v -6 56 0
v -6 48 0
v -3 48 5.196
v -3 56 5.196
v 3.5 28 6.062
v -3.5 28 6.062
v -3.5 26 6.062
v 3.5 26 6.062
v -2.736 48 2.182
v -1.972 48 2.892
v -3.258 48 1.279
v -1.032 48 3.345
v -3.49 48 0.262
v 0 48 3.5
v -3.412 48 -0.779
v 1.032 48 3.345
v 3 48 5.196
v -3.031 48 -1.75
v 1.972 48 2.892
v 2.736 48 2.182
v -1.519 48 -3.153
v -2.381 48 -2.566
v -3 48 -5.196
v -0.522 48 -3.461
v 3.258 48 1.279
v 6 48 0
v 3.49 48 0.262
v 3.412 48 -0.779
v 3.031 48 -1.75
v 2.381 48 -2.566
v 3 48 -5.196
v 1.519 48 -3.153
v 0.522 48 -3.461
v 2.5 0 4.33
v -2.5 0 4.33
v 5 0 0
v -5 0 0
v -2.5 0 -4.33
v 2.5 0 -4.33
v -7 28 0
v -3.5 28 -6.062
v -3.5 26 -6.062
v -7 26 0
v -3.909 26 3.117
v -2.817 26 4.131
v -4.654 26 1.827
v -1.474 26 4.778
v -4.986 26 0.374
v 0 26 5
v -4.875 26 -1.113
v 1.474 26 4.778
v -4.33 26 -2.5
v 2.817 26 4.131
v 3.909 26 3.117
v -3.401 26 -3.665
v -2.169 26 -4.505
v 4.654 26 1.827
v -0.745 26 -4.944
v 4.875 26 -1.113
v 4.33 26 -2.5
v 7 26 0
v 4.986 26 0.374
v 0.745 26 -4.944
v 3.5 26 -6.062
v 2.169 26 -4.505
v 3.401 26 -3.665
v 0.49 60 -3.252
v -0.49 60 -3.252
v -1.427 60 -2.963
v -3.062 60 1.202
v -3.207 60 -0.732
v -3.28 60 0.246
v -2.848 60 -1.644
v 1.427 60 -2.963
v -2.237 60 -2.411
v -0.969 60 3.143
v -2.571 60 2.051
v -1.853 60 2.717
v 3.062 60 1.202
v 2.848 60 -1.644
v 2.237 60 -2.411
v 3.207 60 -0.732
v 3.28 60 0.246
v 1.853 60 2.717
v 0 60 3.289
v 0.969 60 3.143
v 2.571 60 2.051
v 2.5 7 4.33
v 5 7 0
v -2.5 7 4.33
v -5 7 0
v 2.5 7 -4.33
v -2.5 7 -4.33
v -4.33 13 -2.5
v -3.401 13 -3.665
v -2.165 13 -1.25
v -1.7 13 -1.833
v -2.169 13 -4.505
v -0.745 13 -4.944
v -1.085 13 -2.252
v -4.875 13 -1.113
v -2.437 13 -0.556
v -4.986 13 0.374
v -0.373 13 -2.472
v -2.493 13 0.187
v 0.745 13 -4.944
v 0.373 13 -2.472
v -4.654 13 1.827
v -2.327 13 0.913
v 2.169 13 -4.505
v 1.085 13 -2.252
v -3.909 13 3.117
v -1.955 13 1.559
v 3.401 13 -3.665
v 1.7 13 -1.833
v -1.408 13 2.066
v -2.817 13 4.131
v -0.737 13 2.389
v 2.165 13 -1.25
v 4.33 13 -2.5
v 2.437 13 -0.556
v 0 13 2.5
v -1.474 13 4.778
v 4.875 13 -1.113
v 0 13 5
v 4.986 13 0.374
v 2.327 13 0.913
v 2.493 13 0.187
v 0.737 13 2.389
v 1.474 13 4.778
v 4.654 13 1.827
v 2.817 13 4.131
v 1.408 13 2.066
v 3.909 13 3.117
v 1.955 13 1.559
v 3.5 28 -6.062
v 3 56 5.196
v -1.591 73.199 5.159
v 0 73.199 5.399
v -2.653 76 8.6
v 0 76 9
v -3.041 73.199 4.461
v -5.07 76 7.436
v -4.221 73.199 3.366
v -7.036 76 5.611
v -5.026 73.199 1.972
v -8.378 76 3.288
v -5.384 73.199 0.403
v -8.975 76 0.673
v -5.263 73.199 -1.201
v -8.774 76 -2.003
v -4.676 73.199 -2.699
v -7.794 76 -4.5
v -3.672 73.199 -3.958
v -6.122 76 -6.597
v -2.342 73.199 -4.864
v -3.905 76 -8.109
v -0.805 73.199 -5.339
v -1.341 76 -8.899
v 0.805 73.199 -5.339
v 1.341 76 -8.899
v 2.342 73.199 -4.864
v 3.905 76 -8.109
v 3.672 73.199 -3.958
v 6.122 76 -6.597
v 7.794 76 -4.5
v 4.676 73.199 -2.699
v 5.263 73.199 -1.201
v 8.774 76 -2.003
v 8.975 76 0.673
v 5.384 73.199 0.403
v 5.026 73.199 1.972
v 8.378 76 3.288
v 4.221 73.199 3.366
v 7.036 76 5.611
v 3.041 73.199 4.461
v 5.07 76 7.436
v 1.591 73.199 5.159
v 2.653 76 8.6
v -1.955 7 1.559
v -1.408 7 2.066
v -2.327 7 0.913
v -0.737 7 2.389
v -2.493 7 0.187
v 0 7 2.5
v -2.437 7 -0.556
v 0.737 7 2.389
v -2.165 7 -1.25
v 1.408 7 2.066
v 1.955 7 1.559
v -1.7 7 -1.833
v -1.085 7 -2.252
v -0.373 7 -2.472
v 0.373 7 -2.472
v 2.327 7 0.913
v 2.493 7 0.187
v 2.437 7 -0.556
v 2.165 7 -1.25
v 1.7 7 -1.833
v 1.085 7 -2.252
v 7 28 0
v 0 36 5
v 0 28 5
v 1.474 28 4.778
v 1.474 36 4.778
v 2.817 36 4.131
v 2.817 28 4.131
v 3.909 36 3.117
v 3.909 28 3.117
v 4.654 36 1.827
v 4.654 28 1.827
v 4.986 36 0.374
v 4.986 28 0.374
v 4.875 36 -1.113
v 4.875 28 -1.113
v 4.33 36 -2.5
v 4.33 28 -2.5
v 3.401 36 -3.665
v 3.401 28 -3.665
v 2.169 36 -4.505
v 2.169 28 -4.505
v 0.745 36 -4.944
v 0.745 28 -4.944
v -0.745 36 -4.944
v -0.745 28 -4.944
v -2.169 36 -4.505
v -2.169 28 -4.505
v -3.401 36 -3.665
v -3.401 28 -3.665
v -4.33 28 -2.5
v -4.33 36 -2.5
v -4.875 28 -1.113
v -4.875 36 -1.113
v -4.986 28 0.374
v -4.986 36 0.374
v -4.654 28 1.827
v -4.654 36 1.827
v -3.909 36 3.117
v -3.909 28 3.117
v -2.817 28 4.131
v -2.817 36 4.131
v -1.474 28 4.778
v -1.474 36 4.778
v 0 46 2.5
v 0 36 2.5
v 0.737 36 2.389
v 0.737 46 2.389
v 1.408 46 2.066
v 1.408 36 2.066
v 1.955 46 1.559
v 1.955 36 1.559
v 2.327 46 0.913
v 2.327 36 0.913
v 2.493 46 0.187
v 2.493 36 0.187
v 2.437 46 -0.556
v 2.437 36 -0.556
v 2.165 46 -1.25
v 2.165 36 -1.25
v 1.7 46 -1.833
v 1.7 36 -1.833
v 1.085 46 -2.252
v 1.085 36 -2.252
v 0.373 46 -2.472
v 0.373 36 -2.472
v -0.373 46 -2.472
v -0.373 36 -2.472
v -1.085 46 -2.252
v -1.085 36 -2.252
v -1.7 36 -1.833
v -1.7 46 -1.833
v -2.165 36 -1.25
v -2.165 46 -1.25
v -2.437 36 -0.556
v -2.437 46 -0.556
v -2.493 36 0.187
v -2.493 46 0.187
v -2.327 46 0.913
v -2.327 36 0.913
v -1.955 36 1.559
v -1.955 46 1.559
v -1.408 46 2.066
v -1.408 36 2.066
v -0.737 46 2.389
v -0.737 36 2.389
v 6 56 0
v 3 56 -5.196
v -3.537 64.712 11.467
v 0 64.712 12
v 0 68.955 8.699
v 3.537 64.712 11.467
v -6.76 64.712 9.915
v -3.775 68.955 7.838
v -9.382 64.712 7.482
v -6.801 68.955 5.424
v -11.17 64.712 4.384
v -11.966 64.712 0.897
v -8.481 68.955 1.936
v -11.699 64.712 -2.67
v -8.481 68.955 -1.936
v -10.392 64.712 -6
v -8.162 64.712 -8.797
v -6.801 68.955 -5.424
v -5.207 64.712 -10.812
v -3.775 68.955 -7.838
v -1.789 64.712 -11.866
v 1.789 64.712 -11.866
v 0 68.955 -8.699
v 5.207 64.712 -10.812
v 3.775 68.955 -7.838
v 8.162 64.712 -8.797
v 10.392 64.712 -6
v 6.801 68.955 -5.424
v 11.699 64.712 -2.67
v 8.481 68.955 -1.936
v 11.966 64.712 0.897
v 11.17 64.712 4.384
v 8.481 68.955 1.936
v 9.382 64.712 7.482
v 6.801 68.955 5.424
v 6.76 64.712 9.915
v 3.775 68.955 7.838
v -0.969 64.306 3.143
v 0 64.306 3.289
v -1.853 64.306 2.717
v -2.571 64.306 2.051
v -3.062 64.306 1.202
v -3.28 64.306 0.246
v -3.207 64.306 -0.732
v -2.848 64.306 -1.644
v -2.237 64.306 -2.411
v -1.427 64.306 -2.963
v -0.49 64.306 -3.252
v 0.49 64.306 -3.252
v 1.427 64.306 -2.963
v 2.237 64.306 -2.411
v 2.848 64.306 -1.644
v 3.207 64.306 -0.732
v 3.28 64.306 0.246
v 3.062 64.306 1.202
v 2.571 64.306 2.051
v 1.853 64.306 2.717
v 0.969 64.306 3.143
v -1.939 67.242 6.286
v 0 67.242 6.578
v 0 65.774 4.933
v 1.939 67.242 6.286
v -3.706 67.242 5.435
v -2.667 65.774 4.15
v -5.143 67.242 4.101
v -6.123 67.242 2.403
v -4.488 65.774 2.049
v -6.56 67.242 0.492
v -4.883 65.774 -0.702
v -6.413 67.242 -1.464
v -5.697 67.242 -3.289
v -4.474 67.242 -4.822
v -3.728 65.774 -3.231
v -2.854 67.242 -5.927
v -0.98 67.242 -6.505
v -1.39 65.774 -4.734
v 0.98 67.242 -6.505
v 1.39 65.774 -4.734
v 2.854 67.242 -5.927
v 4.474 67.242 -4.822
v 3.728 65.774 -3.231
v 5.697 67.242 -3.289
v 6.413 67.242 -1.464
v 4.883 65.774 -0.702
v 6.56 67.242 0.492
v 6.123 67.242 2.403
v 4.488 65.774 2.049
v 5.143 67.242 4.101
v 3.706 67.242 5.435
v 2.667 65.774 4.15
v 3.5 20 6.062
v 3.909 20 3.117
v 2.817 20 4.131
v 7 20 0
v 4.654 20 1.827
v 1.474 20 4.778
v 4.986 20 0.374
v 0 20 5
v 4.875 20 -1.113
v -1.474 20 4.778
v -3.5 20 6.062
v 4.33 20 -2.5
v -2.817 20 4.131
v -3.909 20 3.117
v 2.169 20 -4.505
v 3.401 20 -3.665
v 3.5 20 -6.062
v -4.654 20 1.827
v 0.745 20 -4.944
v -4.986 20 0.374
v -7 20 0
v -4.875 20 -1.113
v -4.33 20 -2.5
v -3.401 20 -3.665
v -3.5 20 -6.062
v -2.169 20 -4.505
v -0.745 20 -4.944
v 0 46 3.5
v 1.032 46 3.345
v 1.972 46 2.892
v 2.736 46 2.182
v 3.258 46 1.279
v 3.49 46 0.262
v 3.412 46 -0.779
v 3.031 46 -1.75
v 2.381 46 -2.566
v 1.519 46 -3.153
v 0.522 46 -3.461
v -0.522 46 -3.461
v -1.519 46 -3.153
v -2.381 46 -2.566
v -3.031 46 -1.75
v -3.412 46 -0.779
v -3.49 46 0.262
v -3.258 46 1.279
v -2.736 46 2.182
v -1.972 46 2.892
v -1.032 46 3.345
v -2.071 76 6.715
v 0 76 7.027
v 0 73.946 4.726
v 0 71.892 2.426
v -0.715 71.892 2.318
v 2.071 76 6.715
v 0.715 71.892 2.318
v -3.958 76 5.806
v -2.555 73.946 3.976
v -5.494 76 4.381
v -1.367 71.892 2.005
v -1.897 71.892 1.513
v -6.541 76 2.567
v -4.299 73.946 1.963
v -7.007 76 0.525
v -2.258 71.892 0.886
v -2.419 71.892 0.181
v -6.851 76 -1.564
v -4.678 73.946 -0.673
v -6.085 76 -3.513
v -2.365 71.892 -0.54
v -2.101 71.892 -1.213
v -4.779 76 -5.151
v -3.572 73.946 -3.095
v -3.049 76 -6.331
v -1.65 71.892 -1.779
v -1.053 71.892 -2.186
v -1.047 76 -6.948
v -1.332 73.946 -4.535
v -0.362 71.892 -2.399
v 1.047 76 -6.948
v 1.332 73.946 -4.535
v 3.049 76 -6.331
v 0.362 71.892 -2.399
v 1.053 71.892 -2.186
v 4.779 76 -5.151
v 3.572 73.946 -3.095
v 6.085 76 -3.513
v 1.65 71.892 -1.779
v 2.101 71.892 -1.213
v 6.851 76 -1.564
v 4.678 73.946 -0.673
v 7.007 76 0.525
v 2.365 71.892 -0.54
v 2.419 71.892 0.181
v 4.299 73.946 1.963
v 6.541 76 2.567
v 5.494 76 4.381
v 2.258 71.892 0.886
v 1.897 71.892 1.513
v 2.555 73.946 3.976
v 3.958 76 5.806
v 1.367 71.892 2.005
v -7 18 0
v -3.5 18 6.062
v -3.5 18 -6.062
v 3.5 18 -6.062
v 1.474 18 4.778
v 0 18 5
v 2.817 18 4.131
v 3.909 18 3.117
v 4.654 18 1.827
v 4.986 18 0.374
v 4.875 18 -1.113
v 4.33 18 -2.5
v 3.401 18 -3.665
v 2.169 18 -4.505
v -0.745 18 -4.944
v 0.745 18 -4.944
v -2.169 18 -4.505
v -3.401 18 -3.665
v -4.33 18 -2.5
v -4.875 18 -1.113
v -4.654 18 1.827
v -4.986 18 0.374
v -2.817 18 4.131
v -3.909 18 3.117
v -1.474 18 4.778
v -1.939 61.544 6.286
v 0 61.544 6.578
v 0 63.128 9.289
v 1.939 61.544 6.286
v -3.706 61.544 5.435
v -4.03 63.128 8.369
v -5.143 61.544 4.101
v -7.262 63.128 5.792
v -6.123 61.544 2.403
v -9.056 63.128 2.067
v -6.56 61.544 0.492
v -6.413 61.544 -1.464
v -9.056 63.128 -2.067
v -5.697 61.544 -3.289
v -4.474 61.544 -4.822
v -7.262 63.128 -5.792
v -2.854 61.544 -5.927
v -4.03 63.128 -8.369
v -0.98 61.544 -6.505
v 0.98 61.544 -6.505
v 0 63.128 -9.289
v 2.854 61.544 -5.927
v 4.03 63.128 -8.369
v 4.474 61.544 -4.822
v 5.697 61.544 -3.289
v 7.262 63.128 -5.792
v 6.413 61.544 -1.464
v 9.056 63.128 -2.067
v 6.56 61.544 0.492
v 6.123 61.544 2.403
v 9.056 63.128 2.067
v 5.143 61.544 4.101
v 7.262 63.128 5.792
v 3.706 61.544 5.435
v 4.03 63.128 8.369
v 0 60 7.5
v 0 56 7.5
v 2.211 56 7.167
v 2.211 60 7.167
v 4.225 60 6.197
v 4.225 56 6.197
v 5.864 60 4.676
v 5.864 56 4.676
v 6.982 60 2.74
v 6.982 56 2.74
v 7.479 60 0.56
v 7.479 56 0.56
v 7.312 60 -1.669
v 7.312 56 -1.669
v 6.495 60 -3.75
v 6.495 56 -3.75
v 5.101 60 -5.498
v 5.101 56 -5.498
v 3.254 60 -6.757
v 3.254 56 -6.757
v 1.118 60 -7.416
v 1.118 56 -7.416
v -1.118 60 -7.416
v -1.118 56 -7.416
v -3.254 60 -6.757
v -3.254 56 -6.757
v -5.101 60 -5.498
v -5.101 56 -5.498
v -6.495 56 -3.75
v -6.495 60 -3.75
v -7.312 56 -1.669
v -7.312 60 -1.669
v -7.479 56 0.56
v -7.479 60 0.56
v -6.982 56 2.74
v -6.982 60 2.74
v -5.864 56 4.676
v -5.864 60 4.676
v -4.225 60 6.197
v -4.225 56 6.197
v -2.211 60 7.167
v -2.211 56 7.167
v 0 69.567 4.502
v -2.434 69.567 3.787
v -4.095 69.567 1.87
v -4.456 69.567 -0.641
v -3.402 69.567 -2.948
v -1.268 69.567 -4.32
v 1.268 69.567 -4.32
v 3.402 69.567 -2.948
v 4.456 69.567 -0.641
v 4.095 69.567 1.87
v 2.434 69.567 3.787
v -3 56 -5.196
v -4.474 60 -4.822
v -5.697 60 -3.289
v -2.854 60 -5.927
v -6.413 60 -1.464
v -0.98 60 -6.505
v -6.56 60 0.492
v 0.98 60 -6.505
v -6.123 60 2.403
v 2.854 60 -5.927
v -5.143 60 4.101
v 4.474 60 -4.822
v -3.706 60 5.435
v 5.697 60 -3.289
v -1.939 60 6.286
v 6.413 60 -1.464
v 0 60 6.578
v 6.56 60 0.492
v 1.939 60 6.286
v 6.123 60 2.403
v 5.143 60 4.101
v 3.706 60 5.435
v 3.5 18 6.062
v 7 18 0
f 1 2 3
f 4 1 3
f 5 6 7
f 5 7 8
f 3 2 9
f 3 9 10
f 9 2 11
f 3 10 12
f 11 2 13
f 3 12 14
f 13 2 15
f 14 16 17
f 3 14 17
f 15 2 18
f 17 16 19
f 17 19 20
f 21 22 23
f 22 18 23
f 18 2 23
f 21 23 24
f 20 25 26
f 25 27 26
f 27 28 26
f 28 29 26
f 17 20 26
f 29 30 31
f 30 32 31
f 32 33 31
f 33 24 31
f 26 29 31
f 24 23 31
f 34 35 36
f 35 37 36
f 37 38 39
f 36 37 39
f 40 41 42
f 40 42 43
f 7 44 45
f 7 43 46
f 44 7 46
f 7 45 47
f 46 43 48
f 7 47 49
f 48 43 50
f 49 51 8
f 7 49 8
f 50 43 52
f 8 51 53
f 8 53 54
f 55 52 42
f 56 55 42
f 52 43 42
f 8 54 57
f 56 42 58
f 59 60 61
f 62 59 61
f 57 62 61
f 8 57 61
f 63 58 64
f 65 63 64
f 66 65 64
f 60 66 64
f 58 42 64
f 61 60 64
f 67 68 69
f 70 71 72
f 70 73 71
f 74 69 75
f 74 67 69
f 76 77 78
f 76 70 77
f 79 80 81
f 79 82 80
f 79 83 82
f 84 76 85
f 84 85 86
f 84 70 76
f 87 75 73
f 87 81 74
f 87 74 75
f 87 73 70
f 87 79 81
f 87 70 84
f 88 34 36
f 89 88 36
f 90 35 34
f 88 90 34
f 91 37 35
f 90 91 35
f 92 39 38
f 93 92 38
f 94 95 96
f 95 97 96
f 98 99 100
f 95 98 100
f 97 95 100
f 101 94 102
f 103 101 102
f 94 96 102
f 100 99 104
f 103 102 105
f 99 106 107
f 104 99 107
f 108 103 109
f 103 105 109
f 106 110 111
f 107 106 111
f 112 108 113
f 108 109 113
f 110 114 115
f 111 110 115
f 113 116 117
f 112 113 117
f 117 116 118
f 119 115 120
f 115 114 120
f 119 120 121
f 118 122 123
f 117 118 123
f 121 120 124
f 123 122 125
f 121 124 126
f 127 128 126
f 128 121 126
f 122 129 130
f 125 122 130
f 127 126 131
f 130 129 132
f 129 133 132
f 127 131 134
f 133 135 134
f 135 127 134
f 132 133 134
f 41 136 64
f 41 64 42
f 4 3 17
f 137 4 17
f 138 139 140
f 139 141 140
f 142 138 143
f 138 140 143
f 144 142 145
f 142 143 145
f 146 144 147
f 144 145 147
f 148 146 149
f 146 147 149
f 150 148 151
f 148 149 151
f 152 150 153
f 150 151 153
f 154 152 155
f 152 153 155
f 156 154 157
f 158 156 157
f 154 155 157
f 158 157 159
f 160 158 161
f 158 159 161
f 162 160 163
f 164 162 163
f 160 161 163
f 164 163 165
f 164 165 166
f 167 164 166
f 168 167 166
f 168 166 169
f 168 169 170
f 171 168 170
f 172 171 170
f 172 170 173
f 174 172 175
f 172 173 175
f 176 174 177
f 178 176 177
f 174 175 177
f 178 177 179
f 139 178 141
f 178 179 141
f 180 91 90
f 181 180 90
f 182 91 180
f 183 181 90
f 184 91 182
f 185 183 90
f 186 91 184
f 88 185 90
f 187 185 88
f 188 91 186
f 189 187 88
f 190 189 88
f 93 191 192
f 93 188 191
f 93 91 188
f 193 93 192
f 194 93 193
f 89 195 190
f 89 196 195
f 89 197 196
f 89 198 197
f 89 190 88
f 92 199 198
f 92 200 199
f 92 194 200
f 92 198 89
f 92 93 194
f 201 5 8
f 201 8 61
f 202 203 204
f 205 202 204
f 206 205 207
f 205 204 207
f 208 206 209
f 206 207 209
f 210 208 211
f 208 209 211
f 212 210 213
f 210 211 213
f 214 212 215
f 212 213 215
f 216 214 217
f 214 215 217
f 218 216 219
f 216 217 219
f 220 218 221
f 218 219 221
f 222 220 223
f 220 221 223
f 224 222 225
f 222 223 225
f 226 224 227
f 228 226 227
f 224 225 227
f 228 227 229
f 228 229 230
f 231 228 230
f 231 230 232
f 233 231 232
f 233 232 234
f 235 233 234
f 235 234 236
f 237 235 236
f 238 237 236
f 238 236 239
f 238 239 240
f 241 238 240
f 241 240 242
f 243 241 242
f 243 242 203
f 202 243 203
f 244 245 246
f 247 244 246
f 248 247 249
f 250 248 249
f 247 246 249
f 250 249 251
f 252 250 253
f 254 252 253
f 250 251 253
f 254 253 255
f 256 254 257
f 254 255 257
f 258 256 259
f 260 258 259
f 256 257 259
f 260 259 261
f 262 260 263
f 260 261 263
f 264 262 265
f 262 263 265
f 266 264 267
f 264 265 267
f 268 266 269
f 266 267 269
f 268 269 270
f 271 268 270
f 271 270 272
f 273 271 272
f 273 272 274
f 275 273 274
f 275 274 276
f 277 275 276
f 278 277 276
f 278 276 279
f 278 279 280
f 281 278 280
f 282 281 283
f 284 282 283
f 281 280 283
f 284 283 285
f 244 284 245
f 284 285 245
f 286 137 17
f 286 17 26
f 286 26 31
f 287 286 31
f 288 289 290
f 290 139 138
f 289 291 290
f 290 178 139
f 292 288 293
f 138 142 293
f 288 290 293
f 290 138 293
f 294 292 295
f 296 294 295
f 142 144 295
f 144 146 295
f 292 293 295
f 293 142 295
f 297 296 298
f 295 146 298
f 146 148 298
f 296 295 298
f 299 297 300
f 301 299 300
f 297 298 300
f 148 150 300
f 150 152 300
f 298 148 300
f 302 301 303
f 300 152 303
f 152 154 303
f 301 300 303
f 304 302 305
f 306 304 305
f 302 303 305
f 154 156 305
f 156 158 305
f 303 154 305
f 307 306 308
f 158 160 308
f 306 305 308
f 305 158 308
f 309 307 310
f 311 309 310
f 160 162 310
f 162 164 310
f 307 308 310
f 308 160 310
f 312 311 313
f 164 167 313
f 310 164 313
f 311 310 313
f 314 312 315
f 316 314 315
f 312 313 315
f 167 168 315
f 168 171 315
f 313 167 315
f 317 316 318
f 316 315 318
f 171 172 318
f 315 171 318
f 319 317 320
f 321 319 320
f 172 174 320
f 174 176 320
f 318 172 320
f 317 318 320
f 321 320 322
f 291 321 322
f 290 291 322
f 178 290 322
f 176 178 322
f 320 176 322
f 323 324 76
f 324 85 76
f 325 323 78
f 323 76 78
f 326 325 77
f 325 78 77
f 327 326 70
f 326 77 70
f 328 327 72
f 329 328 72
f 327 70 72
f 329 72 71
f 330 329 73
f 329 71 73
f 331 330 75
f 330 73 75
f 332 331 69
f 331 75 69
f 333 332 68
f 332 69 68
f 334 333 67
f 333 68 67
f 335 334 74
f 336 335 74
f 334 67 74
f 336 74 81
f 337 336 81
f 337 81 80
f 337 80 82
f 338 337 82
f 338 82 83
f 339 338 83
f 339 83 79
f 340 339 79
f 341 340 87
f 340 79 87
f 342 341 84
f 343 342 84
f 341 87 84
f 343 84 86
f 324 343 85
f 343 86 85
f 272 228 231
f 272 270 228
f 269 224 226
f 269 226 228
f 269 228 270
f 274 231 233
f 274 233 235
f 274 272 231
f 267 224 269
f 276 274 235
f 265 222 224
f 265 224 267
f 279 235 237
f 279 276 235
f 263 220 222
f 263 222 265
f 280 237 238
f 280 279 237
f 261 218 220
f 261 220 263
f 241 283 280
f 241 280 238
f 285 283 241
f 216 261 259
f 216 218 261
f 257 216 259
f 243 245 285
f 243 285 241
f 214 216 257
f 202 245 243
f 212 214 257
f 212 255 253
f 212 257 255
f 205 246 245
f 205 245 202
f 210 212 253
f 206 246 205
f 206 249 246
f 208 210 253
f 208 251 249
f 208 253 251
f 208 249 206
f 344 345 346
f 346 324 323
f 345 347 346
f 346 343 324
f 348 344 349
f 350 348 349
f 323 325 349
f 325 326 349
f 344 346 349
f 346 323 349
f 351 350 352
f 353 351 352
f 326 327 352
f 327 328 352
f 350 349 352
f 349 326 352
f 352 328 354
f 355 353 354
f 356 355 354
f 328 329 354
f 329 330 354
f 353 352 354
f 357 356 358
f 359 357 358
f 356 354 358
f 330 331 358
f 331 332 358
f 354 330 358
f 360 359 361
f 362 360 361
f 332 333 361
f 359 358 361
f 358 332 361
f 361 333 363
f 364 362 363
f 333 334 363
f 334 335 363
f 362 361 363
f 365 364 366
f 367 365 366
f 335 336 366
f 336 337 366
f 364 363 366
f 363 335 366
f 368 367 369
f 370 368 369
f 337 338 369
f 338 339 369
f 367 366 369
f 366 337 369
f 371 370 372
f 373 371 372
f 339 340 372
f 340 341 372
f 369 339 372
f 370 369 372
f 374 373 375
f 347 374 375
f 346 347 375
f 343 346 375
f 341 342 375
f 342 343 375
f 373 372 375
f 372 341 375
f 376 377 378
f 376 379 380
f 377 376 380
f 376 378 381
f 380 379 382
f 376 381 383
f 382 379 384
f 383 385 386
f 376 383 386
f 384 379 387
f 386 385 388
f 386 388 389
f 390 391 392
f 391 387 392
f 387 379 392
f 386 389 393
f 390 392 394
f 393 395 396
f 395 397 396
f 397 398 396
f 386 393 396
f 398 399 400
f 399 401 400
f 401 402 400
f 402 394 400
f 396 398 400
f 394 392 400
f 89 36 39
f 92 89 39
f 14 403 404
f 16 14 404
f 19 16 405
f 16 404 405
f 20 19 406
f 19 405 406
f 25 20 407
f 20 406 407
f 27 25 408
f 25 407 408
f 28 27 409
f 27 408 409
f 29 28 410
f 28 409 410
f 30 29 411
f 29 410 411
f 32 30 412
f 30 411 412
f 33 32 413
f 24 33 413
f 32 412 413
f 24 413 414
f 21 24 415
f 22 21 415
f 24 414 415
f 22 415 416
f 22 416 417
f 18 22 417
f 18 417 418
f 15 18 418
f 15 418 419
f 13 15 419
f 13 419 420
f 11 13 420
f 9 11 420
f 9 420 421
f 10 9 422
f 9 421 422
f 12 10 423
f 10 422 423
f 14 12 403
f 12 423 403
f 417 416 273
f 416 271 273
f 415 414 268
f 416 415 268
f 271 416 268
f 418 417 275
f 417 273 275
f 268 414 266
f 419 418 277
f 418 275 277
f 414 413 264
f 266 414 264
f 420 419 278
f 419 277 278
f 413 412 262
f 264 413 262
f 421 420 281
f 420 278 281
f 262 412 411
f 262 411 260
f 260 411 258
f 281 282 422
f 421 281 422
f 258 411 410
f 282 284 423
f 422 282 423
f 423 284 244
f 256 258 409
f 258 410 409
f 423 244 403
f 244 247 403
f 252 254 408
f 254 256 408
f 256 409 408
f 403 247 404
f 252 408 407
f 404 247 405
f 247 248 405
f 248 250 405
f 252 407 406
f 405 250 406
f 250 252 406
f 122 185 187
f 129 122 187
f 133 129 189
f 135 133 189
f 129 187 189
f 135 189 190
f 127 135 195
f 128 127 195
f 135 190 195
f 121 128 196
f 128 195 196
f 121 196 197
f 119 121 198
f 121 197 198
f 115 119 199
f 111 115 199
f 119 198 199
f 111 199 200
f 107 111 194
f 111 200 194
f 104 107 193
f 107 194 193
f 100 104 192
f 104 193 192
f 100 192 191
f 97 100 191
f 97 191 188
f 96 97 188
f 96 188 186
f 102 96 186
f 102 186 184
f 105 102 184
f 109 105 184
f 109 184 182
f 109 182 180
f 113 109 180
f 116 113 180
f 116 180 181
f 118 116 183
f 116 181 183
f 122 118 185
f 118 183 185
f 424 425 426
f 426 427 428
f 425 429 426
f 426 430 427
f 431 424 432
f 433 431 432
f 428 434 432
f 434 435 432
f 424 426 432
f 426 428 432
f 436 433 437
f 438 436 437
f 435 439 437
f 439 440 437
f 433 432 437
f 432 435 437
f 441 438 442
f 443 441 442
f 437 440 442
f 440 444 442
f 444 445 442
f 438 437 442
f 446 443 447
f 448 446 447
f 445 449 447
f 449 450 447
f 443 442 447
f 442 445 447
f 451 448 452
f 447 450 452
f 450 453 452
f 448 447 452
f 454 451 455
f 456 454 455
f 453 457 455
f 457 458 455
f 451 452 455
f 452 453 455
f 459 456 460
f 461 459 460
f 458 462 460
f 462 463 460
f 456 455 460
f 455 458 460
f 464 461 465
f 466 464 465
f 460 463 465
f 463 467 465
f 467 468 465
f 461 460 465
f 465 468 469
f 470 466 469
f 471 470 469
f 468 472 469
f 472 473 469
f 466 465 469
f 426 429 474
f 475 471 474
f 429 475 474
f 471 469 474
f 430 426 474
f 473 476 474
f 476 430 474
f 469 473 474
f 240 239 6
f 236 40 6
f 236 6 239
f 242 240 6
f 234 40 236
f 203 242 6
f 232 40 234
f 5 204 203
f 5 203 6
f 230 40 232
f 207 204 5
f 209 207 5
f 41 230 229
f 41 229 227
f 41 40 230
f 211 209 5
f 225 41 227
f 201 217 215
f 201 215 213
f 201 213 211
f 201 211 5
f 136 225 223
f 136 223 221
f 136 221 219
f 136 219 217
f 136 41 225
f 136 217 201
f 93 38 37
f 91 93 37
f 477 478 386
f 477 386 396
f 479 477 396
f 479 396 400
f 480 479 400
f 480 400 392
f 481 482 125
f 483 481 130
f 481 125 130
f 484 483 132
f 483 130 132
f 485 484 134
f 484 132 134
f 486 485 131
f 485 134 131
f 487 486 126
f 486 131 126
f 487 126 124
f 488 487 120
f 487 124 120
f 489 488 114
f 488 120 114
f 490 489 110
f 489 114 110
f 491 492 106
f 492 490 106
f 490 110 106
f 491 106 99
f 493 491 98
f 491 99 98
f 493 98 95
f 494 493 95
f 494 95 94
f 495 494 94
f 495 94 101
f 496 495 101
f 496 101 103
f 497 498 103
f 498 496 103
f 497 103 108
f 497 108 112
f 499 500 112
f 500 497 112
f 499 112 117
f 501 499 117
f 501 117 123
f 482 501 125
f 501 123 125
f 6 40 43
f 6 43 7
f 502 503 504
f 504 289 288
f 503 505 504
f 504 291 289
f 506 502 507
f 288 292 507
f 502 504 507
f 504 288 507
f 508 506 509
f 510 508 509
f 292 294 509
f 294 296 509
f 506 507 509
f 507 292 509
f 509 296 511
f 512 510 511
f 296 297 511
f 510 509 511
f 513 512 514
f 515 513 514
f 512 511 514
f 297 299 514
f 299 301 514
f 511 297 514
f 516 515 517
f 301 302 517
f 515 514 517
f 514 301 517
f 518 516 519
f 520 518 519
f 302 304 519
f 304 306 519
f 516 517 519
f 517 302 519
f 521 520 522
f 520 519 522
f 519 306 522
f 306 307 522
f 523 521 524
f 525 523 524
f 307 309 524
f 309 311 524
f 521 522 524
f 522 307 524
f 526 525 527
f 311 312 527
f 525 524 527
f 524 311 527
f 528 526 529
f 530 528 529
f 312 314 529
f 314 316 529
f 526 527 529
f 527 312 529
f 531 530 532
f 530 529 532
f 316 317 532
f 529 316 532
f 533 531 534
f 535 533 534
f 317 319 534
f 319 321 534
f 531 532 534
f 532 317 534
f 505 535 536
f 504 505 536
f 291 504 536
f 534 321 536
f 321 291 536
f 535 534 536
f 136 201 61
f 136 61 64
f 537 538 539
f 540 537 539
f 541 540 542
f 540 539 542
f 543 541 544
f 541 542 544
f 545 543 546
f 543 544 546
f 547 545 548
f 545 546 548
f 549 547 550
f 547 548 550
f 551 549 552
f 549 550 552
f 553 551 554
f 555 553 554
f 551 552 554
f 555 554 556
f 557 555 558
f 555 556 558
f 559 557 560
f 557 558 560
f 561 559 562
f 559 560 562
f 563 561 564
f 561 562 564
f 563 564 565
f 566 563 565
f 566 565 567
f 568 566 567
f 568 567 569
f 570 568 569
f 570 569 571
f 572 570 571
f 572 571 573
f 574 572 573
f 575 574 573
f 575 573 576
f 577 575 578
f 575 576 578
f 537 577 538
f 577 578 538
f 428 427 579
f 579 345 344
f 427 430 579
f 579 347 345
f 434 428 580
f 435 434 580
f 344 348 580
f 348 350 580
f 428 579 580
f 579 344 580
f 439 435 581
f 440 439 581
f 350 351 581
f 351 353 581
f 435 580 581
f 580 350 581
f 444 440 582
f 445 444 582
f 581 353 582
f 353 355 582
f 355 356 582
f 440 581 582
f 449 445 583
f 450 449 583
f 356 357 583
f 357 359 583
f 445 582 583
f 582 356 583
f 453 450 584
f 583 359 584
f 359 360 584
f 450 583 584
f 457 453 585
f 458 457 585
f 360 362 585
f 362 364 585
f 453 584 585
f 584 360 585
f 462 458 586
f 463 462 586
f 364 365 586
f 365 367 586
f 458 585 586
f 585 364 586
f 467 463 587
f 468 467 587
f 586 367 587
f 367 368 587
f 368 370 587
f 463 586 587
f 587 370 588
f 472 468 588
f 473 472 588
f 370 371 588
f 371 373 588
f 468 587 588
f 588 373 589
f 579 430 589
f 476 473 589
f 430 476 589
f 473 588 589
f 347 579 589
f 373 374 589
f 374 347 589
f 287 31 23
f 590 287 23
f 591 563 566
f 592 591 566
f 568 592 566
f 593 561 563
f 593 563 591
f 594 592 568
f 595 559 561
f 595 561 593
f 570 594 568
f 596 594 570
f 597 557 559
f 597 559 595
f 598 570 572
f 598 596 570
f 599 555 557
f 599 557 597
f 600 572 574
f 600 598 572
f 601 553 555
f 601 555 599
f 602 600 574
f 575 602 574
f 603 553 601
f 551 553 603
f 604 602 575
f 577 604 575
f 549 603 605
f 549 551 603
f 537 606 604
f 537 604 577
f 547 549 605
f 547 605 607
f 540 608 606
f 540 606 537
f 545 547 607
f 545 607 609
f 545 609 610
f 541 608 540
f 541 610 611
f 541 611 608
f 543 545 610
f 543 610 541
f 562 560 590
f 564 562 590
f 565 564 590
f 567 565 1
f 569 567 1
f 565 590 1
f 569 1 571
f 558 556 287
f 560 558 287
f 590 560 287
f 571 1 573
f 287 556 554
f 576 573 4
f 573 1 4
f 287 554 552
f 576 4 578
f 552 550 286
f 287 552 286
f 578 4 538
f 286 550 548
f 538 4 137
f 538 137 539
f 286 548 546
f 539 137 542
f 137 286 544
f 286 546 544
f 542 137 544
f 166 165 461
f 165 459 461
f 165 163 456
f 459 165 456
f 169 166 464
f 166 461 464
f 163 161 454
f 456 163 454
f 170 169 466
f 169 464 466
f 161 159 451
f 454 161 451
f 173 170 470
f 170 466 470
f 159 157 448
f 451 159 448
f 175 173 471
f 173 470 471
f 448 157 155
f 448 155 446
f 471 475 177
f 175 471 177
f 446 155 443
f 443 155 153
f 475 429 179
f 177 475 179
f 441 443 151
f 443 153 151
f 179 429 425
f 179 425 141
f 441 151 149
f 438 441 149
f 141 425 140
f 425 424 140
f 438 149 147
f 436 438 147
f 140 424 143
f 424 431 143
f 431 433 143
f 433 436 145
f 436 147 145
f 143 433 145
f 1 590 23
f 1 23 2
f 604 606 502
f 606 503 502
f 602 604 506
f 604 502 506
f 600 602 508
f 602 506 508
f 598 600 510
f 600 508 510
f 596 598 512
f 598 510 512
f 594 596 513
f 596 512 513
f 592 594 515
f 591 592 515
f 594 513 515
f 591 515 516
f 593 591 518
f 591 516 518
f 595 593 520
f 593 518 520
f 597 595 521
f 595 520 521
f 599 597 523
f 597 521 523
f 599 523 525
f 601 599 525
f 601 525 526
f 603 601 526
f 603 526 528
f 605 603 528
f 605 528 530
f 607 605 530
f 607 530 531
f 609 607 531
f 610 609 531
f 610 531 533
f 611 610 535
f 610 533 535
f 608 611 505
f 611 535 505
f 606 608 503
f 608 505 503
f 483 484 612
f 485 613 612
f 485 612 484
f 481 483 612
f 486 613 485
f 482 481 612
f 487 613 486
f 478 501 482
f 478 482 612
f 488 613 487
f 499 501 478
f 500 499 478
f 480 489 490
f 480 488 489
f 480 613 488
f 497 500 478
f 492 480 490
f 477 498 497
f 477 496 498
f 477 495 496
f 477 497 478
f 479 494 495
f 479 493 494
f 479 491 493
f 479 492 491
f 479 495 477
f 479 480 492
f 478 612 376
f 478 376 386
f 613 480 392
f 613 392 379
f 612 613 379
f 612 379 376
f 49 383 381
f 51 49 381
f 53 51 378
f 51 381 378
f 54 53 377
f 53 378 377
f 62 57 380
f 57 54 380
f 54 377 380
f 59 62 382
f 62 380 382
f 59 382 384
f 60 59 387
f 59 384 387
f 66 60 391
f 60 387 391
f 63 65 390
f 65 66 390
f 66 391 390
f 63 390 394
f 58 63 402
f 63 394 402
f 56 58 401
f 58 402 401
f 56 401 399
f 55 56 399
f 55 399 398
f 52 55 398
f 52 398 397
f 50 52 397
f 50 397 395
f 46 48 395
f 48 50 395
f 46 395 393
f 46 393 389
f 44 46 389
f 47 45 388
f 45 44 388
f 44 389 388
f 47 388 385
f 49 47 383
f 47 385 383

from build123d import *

# Parameters (mm, degrees)
EXTRUDE_1_DEPTH = 7
SKETCH_2_R      = 2.5
EXTRUDE_2_DEPTH = 6
SKETCH_3_R      = 5
EXTRUDE_3_DEPTH = 23
EXTRUDE_4_DEPTH = 2
EXTRUDE_5_DEPTH = 2
SKETCH_6_R      = 2.5
EXTRUDE_6_DEPTH = 10
SKETCH_7_R      = 3.5
EXTRUDE_7_DEPTH = 2
EXTRUDE_8_DEPTH = 8
SKETCH_9_R      = 7.5
EXTRUDE_9_DEPTH = 4


with BuildPart() as part:
    # 草图1 → 凸台-拉伸1 (new body)
    with BuildSketch(Plane(origin=(0, 0, 0), x_dir=(1, 0, 0), z_dir=(0, 1, 0))):
        Polygon((-2.5, -4.330127019), (2.5, -4.330127019), (5, 0), (2.5, 4.330127019), (-2.5, 4.330127019), (-5, 0), align=None)
    extrude(amount=EXTRUDE_1_DEPTH)

    # 草图2 → 凸台-拉伸2 (add)
    with BuildSketch(Plane(origin=(0, 7, 0), x_dir=(1, 0, 0), z_dir=(0, 1, 0))):
        with Locations(Location((0, 0, 0), (0, 0, 270))):
            Circle(SKETCH_2_R)
    extrude(amount=EXTRUDE_2_DEPTH)

    # 草图3 → 凸台-拉伸3 (add)
    with BuildSketch(Plane(origin=(0, 13, 0), x_dir=(1, 0, 0), z_dir=(0, 1, 0))):
        with Locations(Location((0, 0, 0), (0, 0, 270))):
            Circle(SKETCH_3_R)
    extrude(amount=EXTRUDE_3_DEPTH)

    # 草图4 → 凸台-拉伸4 (add)
    with BuildSketch(Plane(origin=(0, 18, 0), x_dir=(-1, 0, 0), z_dir=(0, -1, 0))):
        Polygon((3.5, -6.062177826), (7, 0), (3.5, 6.062177826), (-3.5, 6.062177826), (-7, 0), (-3.5, -6.062177826), align=None)
    extrude(amount=-EXTRUDE_4_DEPTH)

    # 草图5 → 凸台-拉伸5 (add)
    with BuildSketch(Plane(origin=(0, 28, 0), x_dir=(1, 0, 0), z_dir=(0, 1, 0))):
        Polygon((-3.5, -6.062177826), (3.5, -6.062177826), (7, 0), (3.5, 6.062177826), (-3.5, 6.062177826), (-7, 0), align=None)
    extrude(amount=-EXTRUDE_5_DEPTH)

    # 草图6 → 凸台-拉伸6 (add)
    with BuildSketch(Plane(origin=(0, 36, 0), x_dir=(1, 0, 0), z_dir=(0, 1, 0))):
        with Locations(Location((0, 0, 0), (0, 0, 270))):
            Circle(SKETCH_6_R)
    extrude(amount=EXTRUDE_6_DEPTH)

    # 草图7 → 凸台-拉伸7 (add)
    with BuildSketch(Plane(origin=(0, 46, 0), x_dir=(1, 0, 0), z_dir=(0, 1, 0))):
        with Locations(Location((0, 0, 0), (0, 0, 270))):
            Circle(SKETCH_7_R)
    extrude(amount=EXTRUDE_7_DEPTH)

    # 草图8 → 凸台-拉伸8 (add)
    with BuildSketch(Plane(origin=(0, 48, 0), x_dir=(1, 0, 0), z_dir=(0, 1, 0))):
        Polygon((-3, 5.196152423), (-6, 0), (-3, -5.196152423), (3, -5.196152423), (6, 0), (3, 5.196152423), align=None)
    extrude(amount=EXTRUDE_8_DEPTH)

    # 草图9 → 凸台-拉伸9 (add)
    with BuildSketch(Plane(origin=(0, 56, 0), x_dir=(1, 0, 0), z_dir=(0, 1, 0))):
        with Locations(Location((0, 0, 0), (0, 0, 270))):
            Circle(SKETCH_9_R)
    extrude(amount=EXTRUDE_9_DEPTH)

    # 草图10 → 旋转2 (revolve)
    with BuildSketch(Plane(origin=(0, 0, 0), x_dir=(0, 0, -1), z_dir=(1, 0, 0)), mode=Mode.PRIVATE) as revolve_2_sk:
        Polygon((3.288999148, 64.305632713), (3.288999148, 60), (6.577998295, 60), (6.577998295, 61.5442992), (12, 64.711607127), (5.398859255, 73.199272663), (9, 76), (7.026755152, 76), (2.426170638, 71.892250876), (6.577998295, 67.242299418), align=None)
    revolve(revolve_2_sk.sketch.rotate(Axis((0, 76, 0), (0, -1, 0)), 180), axis=Axis((0, 76, 0), (0, -1, 0)))


solid = part.part
